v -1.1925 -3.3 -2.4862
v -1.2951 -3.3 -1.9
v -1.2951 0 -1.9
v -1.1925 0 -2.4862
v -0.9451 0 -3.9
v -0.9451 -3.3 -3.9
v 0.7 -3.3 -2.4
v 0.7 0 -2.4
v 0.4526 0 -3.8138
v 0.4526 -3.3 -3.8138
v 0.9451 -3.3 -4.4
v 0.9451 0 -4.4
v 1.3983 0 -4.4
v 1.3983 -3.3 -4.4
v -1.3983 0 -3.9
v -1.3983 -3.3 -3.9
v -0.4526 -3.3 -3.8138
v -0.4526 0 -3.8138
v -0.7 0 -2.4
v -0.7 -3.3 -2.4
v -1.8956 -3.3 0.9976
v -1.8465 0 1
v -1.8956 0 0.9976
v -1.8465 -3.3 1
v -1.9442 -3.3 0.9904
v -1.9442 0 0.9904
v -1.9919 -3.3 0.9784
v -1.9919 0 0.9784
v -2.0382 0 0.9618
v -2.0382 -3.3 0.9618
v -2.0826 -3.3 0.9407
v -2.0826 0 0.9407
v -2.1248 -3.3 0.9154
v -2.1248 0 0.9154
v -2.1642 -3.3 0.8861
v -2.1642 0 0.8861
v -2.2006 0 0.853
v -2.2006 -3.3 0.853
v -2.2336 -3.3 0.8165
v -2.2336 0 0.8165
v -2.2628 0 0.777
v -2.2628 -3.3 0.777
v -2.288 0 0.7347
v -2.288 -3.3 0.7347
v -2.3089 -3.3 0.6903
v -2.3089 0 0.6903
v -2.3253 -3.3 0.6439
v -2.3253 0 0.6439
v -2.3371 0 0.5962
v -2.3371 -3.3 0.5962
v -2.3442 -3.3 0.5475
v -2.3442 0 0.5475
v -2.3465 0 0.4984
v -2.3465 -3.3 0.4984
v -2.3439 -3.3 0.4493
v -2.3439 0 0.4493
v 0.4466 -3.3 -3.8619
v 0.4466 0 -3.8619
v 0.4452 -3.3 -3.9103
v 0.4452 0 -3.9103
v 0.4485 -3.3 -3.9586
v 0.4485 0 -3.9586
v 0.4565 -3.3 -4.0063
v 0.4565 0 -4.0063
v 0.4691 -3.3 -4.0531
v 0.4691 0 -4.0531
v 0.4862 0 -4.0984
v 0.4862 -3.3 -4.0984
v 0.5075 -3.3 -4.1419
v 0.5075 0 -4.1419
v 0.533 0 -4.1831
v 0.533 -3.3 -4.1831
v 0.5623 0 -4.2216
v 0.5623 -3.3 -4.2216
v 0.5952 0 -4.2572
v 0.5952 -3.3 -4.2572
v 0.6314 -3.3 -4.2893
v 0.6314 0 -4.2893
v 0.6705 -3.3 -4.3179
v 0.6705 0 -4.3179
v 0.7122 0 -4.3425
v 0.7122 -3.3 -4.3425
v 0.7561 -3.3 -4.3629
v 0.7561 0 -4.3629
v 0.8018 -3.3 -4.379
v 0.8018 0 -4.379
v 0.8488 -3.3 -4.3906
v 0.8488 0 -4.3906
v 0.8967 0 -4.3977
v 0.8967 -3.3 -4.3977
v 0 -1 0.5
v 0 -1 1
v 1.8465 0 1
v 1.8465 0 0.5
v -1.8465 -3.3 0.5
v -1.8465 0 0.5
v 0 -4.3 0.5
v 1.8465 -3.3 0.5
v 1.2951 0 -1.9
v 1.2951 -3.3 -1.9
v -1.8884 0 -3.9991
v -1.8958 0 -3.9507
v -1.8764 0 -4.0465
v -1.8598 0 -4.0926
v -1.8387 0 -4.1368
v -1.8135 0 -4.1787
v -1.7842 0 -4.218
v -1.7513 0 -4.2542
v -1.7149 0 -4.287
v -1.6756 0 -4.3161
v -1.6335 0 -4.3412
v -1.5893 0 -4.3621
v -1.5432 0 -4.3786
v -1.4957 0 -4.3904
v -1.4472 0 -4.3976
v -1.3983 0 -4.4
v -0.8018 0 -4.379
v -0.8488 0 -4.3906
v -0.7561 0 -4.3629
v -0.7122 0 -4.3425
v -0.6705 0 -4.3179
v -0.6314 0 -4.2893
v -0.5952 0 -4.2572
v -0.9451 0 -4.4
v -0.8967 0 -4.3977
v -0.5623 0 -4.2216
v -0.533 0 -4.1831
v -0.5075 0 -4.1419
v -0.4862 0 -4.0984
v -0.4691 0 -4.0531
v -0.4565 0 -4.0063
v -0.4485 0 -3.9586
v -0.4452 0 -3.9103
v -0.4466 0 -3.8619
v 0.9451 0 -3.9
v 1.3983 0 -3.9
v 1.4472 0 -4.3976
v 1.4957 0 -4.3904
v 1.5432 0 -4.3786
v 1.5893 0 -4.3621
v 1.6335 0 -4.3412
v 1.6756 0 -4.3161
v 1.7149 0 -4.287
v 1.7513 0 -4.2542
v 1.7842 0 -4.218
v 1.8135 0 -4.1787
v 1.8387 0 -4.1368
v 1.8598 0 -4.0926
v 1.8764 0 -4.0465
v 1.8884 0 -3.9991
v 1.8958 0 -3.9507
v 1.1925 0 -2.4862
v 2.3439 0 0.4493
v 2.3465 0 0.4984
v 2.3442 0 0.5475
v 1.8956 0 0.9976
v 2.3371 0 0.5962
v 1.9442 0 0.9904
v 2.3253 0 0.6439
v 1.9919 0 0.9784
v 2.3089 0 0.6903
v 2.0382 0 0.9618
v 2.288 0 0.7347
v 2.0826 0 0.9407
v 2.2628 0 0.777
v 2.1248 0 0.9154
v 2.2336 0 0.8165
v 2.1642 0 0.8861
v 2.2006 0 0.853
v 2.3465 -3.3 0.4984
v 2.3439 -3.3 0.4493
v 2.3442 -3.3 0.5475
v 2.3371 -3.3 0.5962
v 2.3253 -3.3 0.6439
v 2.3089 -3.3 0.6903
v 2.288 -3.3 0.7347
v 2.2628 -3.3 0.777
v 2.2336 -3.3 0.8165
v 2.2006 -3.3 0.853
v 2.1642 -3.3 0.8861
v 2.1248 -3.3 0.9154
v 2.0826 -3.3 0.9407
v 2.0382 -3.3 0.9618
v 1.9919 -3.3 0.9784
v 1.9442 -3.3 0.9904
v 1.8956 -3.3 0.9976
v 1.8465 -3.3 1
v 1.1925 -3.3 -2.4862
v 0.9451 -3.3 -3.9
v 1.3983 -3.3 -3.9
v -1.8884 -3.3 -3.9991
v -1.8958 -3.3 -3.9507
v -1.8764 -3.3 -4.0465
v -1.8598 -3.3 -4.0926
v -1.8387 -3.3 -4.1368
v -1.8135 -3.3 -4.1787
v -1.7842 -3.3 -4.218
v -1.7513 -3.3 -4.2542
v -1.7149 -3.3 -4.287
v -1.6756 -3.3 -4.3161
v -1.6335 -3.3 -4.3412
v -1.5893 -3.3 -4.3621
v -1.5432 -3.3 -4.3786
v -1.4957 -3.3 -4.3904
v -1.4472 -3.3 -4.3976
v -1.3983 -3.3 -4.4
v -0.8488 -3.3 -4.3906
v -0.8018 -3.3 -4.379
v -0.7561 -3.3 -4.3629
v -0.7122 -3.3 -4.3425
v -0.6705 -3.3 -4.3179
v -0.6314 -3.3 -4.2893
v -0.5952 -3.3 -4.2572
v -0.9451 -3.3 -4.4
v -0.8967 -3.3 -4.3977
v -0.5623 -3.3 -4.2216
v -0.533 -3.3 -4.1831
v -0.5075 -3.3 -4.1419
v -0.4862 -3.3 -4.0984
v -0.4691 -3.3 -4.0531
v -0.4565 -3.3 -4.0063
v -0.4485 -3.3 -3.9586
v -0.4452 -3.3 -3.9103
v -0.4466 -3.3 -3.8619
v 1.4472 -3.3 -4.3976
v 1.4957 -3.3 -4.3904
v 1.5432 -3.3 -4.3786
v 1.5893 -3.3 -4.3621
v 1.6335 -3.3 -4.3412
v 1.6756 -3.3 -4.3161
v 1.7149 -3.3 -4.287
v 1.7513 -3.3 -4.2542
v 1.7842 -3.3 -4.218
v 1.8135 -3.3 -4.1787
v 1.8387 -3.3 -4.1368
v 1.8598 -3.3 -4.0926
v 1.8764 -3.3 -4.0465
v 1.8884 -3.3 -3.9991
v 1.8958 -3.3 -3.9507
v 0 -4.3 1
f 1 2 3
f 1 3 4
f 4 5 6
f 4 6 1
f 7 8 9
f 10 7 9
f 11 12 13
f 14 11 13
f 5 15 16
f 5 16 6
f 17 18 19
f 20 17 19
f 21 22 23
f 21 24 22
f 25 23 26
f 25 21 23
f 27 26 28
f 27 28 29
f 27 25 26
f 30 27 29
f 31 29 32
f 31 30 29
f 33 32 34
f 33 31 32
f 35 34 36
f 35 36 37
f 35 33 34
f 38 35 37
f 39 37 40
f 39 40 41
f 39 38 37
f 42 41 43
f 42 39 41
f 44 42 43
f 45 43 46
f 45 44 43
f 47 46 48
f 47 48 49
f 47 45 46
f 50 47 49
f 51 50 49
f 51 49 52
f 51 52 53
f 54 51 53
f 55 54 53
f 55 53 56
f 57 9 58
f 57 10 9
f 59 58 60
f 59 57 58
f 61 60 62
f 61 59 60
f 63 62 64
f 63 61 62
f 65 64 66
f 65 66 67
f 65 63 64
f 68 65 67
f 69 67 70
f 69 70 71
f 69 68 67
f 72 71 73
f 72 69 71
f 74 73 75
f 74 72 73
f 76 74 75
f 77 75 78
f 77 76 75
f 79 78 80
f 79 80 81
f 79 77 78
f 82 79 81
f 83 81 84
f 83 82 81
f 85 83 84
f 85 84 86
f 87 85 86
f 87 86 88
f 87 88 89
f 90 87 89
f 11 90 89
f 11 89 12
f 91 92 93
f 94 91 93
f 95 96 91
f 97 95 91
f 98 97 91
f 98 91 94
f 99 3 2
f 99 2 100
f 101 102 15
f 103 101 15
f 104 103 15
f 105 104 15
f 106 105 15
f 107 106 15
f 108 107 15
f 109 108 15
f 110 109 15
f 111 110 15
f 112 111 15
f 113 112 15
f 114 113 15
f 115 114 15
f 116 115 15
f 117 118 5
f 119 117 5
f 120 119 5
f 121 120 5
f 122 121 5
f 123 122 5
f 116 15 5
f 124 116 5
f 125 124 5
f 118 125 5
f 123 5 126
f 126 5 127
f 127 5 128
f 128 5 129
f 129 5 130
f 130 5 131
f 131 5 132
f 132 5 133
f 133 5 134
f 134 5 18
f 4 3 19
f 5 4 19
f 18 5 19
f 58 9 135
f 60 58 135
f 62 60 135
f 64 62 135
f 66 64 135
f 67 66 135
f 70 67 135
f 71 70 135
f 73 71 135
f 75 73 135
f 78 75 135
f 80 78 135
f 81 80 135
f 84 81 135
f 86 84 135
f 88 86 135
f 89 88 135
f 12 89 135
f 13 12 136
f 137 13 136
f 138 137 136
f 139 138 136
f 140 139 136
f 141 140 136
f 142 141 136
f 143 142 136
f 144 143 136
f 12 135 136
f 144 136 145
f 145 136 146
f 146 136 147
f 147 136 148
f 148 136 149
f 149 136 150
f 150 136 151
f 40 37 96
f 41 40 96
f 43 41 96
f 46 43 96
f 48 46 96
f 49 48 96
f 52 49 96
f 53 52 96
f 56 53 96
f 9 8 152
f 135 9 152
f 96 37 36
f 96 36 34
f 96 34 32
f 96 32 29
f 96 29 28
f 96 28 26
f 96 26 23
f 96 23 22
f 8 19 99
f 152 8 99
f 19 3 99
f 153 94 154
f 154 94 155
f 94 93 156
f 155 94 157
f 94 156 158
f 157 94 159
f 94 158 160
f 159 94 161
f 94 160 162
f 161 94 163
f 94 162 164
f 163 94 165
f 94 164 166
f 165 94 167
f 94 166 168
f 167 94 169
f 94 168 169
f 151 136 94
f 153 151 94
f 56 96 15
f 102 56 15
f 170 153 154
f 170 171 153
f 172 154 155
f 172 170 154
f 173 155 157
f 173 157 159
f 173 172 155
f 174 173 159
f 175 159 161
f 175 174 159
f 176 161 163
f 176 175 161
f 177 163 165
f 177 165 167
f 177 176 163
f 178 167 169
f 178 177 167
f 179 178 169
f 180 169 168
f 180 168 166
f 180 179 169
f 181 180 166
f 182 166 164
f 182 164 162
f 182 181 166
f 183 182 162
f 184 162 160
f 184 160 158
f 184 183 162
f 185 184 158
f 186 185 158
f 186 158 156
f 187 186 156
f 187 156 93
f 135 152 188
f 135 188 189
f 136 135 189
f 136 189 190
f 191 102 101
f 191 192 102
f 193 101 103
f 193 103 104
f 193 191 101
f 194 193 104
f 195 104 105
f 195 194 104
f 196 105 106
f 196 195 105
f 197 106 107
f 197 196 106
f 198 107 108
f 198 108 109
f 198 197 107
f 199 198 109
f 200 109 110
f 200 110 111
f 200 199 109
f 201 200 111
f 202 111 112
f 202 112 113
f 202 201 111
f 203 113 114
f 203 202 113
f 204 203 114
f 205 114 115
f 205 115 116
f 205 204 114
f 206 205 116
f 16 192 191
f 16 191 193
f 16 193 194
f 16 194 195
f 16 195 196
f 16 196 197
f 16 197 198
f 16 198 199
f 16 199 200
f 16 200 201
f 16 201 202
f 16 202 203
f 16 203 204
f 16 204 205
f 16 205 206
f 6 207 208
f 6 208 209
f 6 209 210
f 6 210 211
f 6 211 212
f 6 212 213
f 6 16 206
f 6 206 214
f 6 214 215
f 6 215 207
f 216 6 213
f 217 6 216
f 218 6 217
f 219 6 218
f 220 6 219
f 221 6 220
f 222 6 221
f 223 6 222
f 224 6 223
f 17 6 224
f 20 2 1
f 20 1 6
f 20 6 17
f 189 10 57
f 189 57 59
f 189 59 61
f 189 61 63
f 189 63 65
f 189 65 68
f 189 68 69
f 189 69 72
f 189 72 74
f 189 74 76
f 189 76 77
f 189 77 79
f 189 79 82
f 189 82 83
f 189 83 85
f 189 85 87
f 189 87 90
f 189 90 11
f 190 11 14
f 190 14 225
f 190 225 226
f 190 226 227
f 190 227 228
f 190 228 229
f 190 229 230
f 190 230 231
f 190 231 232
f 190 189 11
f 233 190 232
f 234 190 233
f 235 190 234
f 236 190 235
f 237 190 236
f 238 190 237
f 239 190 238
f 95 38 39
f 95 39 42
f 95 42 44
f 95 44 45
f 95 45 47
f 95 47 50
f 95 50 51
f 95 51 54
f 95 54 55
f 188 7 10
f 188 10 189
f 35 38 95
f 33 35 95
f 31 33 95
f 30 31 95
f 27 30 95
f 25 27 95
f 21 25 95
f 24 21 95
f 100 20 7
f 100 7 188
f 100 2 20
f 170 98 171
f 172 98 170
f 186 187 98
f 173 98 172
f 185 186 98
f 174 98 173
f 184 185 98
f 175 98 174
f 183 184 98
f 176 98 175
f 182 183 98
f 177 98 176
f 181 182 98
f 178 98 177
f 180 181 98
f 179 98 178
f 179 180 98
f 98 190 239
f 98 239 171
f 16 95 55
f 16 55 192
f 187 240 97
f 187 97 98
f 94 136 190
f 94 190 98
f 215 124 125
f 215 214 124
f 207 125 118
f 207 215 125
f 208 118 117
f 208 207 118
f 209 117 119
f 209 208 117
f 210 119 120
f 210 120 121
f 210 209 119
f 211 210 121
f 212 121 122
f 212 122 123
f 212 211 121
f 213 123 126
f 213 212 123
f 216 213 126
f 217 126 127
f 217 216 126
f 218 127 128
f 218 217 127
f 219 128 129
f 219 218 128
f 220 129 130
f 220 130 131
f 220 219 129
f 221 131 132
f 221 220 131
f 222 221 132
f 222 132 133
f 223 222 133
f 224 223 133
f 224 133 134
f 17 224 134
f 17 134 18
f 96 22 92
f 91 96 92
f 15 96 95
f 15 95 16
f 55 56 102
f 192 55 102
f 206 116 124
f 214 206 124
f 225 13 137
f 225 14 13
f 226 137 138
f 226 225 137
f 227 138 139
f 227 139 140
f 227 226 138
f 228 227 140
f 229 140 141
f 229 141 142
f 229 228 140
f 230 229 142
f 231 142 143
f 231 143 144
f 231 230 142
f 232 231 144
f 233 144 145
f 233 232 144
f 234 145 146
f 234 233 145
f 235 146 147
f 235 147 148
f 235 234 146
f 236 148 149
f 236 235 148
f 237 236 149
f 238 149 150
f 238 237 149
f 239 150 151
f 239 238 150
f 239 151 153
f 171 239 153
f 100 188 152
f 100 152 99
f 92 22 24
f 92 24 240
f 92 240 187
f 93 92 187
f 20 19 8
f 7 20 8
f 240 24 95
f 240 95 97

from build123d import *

# Parameters (mm, degrees)
F1_DEPTH    = 3.3
F2_R        = 0.5
F3_T        = 0.5
F3_T3_DEPTH = 4.3
F5_DEPTH    = 0.5
F6_DEPTH    = 0.5


# Not quite as in the source:
# - a shell that OpenCascade refuses in one call is made with other operations: the cavity is built on its own and cut out


with BuildPart() as f1:
    # F0 (on Front) → F1 (new body)
    with BuildSketch(Plane.XZ):
        Polygon((-0.7, -2.4), (0, -2.4), (0.7, -2.4), (0.35, -4.4), (1.85, -4.4), (2.4, 1), (0, 1), (-2.4, 1), (-1.85, -4.4), (-0.35, -4.4), align=None)
    extrude(amount=F1_DEPTH)

    # F2
    f2_edges = [f1.edges().sort_by_distance(p)[0] for p in [
        (2.4, -1.65, 1),
        (1.85, -1.65, -4.4),
        (-0.35, -1.65, -4.4),
        (-2.4, -1.65, 1),
        (0.35, -1.65, -4.4),
        (-1.85, -1.65, -4.4),
    ]]
    fillet(f2_edges, radius=F2_R)

    # F3: shell of thickness 0.5, made by hand


with BuildPart() as f3_core1:
    # F3_t2: copy of F1
    add(f1.part)

    # the walls: a layer under each face that stays
    f3_faces = [f3_core1.faces().sort_by_distance(p)[0] for p in [
        (0.5762916395, -1.65, -3.1069049171),
        (0, -1.65, -2.4),
        (1.17171884, -1.65, -4.4),
        (-0.5762916395, -1.65, -3.1069049171),
        (2.1198397965, -1.65, -1.7506638158),
        (-1.17171884, -1.65, -4.4),
        (0, -1.65, 1),
        (-2.1198397965, -1.65, -1.7506638158),
    ]]
    thicken(f3_faces, amount=-F3_T, mode=Mode.SUBTRACT)

    # F3_s4 → F3_t3 (cut)
    with BuildSketch(Plane.XZ.offset(-0.5)):
        Polygon((0.6950748477, -2.4041380983), (1.1925152336, -2.4861901659), (1.2950985126, -1.9), (0.7, -1.9), align=None)
        Polygon((-0.6950748477, -2.4041380983), (-0.7, -1.9), (-1.2950985126, -1.9), (-1.1925152336, -2.4861901659), align=None)
    extrude(amount=F3_T3_DEPTH, mode=Mode.SUBTRACT)


with BuildPart() as f1_1:
    add(f1.part)

    # what is left inside the walls is the cavity
    f3_cavity = [f3_core1.part.solids().sort_by_distance(p)[0] for p in [
        (-1.617439, -2.2, -1.699493),
    ]]
    add(f3_cavity, mode=Mode.SUBTRACT)

    # F4 (on face) → F5 (join, through all)
    with BuildSketch(Plane.XY.offset(1)):
        Polygon((1.8464873155, -3.3), (-1.8464873155, -3.3), (0, -4.3), align=None)
    extrude(amount=-F5_DEPTH)

    # F4 (on face) → F6 (cut, through all)
    with BuildSketch(Plane.XY.offset(1)):
        Polygon((1.8464873155, 0), (-1.8464873155, 0), (0, -1), align=None)
    extrude(amount=-F6_DEPTH, mode=Mode.SUBTRACT)


solid = f1_1.part
